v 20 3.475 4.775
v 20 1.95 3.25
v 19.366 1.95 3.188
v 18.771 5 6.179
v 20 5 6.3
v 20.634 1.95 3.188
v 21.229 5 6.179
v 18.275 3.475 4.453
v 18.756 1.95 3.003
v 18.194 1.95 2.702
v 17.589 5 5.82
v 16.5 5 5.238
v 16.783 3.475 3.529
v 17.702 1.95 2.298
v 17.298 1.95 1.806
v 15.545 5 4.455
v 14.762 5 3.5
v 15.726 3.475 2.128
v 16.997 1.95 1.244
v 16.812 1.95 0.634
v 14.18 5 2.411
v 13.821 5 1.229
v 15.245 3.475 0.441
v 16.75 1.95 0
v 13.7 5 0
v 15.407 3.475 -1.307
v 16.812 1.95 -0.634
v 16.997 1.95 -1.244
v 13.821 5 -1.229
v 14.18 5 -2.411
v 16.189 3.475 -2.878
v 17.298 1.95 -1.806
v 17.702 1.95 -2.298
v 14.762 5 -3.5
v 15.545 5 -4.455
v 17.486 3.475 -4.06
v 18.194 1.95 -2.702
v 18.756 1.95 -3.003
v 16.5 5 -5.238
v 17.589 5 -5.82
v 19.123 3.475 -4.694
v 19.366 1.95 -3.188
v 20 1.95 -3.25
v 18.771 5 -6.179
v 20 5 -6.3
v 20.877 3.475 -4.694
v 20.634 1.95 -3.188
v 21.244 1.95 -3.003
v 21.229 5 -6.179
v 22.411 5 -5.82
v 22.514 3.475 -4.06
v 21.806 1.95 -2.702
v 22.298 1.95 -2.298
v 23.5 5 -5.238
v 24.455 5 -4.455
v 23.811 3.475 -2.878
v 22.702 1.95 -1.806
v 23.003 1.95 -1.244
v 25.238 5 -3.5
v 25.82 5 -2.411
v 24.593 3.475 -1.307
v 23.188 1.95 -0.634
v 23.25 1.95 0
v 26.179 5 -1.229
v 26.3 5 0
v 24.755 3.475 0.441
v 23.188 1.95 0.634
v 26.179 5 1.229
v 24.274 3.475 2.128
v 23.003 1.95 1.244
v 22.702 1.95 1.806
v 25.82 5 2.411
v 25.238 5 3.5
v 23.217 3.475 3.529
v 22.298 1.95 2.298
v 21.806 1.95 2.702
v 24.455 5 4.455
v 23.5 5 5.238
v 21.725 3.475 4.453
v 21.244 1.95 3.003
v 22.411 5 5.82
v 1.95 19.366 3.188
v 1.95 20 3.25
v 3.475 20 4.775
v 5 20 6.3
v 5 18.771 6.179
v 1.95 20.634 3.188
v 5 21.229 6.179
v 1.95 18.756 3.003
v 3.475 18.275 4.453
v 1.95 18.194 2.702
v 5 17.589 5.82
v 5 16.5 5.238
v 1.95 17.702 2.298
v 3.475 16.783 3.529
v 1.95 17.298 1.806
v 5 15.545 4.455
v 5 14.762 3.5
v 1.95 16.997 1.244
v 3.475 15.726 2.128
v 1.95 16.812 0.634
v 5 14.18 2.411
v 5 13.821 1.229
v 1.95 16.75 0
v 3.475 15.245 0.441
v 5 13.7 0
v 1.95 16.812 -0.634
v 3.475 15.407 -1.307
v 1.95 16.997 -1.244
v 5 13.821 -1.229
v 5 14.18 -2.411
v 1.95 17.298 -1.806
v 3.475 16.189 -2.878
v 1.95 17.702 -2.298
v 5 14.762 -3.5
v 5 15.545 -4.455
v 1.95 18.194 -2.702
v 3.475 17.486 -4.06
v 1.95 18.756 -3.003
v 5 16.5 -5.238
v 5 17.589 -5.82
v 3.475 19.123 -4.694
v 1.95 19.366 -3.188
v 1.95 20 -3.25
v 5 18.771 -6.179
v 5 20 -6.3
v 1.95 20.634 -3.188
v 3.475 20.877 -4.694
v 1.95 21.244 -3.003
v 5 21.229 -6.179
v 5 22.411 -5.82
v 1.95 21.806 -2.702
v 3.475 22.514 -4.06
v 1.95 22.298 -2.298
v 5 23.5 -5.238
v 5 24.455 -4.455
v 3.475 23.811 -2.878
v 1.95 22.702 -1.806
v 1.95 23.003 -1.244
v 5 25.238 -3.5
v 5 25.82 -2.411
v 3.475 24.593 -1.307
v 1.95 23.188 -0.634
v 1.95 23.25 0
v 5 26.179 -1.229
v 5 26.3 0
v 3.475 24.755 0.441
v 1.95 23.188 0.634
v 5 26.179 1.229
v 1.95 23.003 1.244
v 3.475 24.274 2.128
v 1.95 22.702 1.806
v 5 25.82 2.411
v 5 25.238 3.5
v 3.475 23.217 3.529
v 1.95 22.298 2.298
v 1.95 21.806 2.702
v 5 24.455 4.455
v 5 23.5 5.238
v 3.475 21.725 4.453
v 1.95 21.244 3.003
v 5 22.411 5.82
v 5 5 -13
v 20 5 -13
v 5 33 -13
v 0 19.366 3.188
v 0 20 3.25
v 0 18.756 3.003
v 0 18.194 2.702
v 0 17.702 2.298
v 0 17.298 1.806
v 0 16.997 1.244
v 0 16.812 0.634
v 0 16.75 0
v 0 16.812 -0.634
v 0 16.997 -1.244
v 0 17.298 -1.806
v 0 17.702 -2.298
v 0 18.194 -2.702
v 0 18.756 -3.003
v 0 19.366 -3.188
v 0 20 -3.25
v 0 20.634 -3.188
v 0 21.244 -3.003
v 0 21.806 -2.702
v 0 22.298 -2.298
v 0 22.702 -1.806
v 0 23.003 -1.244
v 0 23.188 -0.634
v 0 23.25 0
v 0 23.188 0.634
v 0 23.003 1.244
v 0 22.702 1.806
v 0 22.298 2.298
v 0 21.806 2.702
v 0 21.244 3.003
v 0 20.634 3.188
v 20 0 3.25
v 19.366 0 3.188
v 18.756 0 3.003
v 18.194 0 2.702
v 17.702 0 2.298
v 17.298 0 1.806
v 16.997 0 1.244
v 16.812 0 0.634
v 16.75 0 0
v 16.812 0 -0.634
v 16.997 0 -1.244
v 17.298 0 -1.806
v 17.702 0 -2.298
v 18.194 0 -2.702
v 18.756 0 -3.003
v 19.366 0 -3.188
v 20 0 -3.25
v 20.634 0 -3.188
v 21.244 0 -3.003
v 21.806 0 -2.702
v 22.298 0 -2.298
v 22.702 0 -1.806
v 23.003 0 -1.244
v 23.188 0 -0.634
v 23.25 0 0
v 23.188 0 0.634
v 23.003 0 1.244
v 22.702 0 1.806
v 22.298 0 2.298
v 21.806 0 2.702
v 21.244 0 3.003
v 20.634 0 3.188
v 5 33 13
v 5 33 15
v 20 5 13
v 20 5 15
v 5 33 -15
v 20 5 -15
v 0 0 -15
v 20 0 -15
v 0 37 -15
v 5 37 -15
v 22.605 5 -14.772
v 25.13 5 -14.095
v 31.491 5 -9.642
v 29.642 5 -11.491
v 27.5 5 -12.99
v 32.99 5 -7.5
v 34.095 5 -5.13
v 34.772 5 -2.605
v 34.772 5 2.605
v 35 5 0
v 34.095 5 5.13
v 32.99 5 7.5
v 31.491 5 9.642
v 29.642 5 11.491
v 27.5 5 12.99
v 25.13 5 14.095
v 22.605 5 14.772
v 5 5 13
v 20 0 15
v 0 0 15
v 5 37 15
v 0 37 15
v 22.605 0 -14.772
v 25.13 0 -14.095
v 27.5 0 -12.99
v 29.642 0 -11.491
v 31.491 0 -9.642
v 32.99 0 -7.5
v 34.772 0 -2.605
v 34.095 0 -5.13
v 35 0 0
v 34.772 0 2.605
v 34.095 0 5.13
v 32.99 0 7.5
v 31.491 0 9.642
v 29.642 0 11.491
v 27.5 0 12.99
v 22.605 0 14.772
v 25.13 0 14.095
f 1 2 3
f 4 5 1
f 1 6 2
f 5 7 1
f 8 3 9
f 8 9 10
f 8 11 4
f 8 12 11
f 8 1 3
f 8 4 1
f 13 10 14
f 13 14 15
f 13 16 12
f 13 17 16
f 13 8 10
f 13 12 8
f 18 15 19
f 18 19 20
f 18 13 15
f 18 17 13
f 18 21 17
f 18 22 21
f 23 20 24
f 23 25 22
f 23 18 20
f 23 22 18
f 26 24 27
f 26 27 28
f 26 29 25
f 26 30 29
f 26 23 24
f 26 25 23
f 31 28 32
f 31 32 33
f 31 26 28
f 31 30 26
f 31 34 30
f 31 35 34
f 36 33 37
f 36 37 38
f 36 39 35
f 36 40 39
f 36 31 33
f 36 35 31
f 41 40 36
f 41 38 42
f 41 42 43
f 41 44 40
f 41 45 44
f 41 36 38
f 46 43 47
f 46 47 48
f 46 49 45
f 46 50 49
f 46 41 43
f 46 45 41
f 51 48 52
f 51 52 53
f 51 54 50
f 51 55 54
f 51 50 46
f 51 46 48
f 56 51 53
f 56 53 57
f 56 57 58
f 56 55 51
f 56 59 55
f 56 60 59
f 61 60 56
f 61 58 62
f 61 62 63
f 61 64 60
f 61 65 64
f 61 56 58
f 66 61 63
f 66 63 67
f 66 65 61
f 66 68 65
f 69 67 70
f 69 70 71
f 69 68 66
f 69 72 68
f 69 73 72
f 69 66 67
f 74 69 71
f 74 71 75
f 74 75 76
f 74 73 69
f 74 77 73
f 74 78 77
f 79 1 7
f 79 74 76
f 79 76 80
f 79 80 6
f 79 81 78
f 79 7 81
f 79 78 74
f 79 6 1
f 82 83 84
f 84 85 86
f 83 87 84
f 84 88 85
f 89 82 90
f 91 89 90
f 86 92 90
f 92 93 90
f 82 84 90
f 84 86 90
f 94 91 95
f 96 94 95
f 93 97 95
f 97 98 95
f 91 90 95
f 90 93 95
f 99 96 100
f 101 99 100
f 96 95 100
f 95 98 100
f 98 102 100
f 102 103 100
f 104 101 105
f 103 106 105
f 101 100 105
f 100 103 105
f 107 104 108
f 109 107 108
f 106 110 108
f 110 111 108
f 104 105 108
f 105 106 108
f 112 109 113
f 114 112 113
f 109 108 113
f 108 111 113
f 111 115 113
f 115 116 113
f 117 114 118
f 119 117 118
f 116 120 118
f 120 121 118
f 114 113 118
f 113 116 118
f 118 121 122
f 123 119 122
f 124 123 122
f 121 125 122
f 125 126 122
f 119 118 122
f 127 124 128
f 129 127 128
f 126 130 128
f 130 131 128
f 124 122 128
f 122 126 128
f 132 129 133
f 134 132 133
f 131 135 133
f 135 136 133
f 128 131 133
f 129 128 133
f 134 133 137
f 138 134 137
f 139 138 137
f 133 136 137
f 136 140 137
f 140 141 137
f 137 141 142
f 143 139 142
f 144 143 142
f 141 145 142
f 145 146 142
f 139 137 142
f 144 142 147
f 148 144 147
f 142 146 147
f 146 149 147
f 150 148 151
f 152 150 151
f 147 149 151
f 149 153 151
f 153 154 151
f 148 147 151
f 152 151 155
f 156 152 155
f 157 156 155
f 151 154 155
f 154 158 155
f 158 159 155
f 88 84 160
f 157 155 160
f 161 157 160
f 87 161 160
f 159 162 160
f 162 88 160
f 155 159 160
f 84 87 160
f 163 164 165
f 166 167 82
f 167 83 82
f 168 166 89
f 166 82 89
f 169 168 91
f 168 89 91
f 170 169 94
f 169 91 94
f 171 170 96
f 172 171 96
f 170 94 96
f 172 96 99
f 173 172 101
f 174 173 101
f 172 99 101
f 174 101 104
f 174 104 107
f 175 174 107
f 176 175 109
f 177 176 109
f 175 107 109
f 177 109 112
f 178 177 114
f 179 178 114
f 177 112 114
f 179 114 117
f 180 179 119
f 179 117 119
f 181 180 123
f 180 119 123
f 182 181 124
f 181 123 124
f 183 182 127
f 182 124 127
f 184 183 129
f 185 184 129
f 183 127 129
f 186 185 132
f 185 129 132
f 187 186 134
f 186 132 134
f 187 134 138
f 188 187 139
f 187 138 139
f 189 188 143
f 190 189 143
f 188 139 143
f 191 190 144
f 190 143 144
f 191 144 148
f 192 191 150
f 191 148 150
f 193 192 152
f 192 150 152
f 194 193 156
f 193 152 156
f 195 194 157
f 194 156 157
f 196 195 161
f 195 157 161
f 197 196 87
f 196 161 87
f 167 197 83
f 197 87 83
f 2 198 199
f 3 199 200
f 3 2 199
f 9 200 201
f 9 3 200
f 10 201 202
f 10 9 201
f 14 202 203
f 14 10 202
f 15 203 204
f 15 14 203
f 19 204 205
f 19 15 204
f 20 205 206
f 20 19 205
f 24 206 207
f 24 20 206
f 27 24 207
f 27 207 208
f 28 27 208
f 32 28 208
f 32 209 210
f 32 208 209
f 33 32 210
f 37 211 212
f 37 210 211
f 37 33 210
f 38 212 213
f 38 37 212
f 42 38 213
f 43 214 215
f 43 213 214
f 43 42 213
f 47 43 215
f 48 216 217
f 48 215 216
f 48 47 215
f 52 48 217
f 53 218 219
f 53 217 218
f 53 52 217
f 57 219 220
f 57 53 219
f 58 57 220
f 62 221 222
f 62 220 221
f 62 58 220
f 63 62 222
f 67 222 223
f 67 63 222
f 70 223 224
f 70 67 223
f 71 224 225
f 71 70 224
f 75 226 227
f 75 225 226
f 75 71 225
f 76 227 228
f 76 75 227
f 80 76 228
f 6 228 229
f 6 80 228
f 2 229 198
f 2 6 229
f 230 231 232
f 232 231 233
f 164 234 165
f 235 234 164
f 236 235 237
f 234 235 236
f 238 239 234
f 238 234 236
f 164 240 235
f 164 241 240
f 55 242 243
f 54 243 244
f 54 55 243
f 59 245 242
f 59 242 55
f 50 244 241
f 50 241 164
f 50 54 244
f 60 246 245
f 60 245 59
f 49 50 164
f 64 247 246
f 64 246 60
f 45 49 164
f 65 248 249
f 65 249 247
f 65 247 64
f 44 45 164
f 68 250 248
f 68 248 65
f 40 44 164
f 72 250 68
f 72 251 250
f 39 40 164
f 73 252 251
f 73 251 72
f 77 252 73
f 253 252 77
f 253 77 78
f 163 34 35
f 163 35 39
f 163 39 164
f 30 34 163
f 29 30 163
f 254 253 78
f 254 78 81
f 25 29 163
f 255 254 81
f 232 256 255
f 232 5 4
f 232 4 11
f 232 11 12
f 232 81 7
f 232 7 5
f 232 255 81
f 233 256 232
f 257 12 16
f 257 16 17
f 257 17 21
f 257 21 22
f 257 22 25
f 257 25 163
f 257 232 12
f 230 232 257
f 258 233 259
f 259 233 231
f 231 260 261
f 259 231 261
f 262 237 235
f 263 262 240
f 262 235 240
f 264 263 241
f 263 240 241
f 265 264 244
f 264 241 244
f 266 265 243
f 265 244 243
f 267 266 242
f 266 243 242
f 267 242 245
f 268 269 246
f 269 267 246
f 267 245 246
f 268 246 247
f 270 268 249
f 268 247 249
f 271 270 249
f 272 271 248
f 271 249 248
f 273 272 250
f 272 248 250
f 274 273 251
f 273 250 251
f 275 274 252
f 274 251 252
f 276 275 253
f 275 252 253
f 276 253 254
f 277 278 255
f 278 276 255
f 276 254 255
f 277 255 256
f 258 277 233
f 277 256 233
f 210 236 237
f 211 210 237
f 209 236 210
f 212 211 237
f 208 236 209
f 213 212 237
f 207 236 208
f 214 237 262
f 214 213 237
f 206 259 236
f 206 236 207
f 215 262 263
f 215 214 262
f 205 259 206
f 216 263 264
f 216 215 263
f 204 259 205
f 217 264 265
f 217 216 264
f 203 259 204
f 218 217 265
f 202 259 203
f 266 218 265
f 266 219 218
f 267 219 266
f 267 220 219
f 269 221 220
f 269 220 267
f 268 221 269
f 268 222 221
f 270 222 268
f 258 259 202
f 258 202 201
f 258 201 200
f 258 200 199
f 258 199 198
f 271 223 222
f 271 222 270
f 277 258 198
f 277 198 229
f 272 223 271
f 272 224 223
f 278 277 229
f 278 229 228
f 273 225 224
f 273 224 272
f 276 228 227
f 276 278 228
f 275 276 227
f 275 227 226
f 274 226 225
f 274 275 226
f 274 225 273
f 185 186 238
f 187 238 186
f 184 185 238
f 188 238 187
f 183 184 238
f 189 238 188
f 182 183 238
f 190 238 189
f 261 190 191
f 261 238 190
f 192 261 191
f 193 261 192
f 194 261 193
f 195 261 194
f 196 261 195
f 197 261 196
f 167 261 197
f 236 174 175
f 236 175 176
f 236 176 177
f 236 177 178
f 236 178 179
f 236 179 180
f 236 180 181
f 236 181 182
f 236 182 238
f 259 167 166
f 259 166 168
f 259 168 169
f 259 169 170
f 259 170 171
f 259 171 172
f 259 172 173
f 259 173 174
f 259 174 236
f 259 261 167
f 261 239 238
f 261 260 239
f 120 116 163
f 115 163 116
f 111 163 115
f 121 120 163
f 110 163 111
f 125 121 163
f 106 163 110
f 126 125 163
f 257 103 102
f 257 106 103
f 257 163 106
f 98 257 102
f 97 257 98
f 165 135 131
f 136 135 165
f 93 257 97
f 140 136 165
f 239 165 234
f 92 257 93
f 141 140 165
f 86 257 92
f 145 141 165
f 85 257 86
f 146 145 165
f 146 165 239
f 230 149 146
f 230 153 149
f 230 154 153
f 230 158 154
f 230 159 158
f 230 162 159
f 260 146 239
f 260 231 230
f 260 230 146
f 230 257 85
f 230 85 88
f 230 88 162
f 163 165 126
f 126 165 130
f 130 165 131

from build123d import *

# Parameters (mm, degrees)
EXTRUDE_1_DEPTH     = 15
CUT_EXTRUDE_2_DEPTH = 6
EXTRUDE_2_DEPTH     = 2


with BuildPart() as part:
    # Эскиз1 → Бобышка-Вытянуть1 (new body, symmetric)
    with BuildSketch(Plane.XY):
        Polygon((0, 37), (0, 0), (35, 0), (35, 5), (5, 5), (5, 37), align=None)
    extrude(amount=EXTRUDE_1_DEPTH, both=True)

    # Эскиз5 → Вырез-Вытянуть2 (cut, through all)
    with BuildSketch(Plane(origin=(0, 5, 0), x_dir=(1, 0, 0), z_dir=(0, 1, 0))):
        with BuildLine():
            Line((35, 15), (20, 15))
            ThreePointArc((20, 15), (30.606601718, 10.606601718), (35, 0))
            Line((35, 0), (35, 15))
        make_face()
        with BuildLine():
            Line((35, -15), (35, 0))
            ThreePointArc((35, 0), (30.606601718, -10.606601718), (20, -15))
            Line((20, -15), (35, -15))
        make_face()
    extrude(amount=-CUT_EXTRUDE_2_DEPTH, mode=Mode.SUBTRACT)

    # Эскиз2 → Бобышка-Вытянуть2 (add)
    with BuildSketch(Plane.XY.offset(15)):
        Polygon((5, 33), (20, 5), (5, 5), align=None)
    extrude_2 = extrude(amount=-EXTRUDE_2_DEPTH)

    # Зеркальное отражение2: Бобышка-Вытянуть2 across plane
    add(extrude_2.mirror(Plane.XY))

    # Эскиз8 → Зенковка для винта с полупотайной головкой M61 (revolve, cut)
    with BuildSketch(Plane(origin=(20, 5, 0), x_dir=(0, 0, 1), z_dir=(1, 0, 0))):
        Polygon((0, 0), (0, 11.202797012), (3.25, 9.25), (3.25, 3.05), (6.3, 0), align=None)
    hole_wizard_m61 = revolve(axis=Axis((20, 11.35, 0), (0, -1, 0)), mode=Mode.SUBTRACT)

    # Зеркальное отражение3: Зенковка для винта с полупотайной головкой M61 across plane
    add(hole_wizard_m61.mirror(Plane(origin=(0, 0, 0), x_dir=(0, 0, 1), z_dir=(-0.707106781, 0.707106781, 0))), mode=Mode.SUBTRACT)


solid = part.part
